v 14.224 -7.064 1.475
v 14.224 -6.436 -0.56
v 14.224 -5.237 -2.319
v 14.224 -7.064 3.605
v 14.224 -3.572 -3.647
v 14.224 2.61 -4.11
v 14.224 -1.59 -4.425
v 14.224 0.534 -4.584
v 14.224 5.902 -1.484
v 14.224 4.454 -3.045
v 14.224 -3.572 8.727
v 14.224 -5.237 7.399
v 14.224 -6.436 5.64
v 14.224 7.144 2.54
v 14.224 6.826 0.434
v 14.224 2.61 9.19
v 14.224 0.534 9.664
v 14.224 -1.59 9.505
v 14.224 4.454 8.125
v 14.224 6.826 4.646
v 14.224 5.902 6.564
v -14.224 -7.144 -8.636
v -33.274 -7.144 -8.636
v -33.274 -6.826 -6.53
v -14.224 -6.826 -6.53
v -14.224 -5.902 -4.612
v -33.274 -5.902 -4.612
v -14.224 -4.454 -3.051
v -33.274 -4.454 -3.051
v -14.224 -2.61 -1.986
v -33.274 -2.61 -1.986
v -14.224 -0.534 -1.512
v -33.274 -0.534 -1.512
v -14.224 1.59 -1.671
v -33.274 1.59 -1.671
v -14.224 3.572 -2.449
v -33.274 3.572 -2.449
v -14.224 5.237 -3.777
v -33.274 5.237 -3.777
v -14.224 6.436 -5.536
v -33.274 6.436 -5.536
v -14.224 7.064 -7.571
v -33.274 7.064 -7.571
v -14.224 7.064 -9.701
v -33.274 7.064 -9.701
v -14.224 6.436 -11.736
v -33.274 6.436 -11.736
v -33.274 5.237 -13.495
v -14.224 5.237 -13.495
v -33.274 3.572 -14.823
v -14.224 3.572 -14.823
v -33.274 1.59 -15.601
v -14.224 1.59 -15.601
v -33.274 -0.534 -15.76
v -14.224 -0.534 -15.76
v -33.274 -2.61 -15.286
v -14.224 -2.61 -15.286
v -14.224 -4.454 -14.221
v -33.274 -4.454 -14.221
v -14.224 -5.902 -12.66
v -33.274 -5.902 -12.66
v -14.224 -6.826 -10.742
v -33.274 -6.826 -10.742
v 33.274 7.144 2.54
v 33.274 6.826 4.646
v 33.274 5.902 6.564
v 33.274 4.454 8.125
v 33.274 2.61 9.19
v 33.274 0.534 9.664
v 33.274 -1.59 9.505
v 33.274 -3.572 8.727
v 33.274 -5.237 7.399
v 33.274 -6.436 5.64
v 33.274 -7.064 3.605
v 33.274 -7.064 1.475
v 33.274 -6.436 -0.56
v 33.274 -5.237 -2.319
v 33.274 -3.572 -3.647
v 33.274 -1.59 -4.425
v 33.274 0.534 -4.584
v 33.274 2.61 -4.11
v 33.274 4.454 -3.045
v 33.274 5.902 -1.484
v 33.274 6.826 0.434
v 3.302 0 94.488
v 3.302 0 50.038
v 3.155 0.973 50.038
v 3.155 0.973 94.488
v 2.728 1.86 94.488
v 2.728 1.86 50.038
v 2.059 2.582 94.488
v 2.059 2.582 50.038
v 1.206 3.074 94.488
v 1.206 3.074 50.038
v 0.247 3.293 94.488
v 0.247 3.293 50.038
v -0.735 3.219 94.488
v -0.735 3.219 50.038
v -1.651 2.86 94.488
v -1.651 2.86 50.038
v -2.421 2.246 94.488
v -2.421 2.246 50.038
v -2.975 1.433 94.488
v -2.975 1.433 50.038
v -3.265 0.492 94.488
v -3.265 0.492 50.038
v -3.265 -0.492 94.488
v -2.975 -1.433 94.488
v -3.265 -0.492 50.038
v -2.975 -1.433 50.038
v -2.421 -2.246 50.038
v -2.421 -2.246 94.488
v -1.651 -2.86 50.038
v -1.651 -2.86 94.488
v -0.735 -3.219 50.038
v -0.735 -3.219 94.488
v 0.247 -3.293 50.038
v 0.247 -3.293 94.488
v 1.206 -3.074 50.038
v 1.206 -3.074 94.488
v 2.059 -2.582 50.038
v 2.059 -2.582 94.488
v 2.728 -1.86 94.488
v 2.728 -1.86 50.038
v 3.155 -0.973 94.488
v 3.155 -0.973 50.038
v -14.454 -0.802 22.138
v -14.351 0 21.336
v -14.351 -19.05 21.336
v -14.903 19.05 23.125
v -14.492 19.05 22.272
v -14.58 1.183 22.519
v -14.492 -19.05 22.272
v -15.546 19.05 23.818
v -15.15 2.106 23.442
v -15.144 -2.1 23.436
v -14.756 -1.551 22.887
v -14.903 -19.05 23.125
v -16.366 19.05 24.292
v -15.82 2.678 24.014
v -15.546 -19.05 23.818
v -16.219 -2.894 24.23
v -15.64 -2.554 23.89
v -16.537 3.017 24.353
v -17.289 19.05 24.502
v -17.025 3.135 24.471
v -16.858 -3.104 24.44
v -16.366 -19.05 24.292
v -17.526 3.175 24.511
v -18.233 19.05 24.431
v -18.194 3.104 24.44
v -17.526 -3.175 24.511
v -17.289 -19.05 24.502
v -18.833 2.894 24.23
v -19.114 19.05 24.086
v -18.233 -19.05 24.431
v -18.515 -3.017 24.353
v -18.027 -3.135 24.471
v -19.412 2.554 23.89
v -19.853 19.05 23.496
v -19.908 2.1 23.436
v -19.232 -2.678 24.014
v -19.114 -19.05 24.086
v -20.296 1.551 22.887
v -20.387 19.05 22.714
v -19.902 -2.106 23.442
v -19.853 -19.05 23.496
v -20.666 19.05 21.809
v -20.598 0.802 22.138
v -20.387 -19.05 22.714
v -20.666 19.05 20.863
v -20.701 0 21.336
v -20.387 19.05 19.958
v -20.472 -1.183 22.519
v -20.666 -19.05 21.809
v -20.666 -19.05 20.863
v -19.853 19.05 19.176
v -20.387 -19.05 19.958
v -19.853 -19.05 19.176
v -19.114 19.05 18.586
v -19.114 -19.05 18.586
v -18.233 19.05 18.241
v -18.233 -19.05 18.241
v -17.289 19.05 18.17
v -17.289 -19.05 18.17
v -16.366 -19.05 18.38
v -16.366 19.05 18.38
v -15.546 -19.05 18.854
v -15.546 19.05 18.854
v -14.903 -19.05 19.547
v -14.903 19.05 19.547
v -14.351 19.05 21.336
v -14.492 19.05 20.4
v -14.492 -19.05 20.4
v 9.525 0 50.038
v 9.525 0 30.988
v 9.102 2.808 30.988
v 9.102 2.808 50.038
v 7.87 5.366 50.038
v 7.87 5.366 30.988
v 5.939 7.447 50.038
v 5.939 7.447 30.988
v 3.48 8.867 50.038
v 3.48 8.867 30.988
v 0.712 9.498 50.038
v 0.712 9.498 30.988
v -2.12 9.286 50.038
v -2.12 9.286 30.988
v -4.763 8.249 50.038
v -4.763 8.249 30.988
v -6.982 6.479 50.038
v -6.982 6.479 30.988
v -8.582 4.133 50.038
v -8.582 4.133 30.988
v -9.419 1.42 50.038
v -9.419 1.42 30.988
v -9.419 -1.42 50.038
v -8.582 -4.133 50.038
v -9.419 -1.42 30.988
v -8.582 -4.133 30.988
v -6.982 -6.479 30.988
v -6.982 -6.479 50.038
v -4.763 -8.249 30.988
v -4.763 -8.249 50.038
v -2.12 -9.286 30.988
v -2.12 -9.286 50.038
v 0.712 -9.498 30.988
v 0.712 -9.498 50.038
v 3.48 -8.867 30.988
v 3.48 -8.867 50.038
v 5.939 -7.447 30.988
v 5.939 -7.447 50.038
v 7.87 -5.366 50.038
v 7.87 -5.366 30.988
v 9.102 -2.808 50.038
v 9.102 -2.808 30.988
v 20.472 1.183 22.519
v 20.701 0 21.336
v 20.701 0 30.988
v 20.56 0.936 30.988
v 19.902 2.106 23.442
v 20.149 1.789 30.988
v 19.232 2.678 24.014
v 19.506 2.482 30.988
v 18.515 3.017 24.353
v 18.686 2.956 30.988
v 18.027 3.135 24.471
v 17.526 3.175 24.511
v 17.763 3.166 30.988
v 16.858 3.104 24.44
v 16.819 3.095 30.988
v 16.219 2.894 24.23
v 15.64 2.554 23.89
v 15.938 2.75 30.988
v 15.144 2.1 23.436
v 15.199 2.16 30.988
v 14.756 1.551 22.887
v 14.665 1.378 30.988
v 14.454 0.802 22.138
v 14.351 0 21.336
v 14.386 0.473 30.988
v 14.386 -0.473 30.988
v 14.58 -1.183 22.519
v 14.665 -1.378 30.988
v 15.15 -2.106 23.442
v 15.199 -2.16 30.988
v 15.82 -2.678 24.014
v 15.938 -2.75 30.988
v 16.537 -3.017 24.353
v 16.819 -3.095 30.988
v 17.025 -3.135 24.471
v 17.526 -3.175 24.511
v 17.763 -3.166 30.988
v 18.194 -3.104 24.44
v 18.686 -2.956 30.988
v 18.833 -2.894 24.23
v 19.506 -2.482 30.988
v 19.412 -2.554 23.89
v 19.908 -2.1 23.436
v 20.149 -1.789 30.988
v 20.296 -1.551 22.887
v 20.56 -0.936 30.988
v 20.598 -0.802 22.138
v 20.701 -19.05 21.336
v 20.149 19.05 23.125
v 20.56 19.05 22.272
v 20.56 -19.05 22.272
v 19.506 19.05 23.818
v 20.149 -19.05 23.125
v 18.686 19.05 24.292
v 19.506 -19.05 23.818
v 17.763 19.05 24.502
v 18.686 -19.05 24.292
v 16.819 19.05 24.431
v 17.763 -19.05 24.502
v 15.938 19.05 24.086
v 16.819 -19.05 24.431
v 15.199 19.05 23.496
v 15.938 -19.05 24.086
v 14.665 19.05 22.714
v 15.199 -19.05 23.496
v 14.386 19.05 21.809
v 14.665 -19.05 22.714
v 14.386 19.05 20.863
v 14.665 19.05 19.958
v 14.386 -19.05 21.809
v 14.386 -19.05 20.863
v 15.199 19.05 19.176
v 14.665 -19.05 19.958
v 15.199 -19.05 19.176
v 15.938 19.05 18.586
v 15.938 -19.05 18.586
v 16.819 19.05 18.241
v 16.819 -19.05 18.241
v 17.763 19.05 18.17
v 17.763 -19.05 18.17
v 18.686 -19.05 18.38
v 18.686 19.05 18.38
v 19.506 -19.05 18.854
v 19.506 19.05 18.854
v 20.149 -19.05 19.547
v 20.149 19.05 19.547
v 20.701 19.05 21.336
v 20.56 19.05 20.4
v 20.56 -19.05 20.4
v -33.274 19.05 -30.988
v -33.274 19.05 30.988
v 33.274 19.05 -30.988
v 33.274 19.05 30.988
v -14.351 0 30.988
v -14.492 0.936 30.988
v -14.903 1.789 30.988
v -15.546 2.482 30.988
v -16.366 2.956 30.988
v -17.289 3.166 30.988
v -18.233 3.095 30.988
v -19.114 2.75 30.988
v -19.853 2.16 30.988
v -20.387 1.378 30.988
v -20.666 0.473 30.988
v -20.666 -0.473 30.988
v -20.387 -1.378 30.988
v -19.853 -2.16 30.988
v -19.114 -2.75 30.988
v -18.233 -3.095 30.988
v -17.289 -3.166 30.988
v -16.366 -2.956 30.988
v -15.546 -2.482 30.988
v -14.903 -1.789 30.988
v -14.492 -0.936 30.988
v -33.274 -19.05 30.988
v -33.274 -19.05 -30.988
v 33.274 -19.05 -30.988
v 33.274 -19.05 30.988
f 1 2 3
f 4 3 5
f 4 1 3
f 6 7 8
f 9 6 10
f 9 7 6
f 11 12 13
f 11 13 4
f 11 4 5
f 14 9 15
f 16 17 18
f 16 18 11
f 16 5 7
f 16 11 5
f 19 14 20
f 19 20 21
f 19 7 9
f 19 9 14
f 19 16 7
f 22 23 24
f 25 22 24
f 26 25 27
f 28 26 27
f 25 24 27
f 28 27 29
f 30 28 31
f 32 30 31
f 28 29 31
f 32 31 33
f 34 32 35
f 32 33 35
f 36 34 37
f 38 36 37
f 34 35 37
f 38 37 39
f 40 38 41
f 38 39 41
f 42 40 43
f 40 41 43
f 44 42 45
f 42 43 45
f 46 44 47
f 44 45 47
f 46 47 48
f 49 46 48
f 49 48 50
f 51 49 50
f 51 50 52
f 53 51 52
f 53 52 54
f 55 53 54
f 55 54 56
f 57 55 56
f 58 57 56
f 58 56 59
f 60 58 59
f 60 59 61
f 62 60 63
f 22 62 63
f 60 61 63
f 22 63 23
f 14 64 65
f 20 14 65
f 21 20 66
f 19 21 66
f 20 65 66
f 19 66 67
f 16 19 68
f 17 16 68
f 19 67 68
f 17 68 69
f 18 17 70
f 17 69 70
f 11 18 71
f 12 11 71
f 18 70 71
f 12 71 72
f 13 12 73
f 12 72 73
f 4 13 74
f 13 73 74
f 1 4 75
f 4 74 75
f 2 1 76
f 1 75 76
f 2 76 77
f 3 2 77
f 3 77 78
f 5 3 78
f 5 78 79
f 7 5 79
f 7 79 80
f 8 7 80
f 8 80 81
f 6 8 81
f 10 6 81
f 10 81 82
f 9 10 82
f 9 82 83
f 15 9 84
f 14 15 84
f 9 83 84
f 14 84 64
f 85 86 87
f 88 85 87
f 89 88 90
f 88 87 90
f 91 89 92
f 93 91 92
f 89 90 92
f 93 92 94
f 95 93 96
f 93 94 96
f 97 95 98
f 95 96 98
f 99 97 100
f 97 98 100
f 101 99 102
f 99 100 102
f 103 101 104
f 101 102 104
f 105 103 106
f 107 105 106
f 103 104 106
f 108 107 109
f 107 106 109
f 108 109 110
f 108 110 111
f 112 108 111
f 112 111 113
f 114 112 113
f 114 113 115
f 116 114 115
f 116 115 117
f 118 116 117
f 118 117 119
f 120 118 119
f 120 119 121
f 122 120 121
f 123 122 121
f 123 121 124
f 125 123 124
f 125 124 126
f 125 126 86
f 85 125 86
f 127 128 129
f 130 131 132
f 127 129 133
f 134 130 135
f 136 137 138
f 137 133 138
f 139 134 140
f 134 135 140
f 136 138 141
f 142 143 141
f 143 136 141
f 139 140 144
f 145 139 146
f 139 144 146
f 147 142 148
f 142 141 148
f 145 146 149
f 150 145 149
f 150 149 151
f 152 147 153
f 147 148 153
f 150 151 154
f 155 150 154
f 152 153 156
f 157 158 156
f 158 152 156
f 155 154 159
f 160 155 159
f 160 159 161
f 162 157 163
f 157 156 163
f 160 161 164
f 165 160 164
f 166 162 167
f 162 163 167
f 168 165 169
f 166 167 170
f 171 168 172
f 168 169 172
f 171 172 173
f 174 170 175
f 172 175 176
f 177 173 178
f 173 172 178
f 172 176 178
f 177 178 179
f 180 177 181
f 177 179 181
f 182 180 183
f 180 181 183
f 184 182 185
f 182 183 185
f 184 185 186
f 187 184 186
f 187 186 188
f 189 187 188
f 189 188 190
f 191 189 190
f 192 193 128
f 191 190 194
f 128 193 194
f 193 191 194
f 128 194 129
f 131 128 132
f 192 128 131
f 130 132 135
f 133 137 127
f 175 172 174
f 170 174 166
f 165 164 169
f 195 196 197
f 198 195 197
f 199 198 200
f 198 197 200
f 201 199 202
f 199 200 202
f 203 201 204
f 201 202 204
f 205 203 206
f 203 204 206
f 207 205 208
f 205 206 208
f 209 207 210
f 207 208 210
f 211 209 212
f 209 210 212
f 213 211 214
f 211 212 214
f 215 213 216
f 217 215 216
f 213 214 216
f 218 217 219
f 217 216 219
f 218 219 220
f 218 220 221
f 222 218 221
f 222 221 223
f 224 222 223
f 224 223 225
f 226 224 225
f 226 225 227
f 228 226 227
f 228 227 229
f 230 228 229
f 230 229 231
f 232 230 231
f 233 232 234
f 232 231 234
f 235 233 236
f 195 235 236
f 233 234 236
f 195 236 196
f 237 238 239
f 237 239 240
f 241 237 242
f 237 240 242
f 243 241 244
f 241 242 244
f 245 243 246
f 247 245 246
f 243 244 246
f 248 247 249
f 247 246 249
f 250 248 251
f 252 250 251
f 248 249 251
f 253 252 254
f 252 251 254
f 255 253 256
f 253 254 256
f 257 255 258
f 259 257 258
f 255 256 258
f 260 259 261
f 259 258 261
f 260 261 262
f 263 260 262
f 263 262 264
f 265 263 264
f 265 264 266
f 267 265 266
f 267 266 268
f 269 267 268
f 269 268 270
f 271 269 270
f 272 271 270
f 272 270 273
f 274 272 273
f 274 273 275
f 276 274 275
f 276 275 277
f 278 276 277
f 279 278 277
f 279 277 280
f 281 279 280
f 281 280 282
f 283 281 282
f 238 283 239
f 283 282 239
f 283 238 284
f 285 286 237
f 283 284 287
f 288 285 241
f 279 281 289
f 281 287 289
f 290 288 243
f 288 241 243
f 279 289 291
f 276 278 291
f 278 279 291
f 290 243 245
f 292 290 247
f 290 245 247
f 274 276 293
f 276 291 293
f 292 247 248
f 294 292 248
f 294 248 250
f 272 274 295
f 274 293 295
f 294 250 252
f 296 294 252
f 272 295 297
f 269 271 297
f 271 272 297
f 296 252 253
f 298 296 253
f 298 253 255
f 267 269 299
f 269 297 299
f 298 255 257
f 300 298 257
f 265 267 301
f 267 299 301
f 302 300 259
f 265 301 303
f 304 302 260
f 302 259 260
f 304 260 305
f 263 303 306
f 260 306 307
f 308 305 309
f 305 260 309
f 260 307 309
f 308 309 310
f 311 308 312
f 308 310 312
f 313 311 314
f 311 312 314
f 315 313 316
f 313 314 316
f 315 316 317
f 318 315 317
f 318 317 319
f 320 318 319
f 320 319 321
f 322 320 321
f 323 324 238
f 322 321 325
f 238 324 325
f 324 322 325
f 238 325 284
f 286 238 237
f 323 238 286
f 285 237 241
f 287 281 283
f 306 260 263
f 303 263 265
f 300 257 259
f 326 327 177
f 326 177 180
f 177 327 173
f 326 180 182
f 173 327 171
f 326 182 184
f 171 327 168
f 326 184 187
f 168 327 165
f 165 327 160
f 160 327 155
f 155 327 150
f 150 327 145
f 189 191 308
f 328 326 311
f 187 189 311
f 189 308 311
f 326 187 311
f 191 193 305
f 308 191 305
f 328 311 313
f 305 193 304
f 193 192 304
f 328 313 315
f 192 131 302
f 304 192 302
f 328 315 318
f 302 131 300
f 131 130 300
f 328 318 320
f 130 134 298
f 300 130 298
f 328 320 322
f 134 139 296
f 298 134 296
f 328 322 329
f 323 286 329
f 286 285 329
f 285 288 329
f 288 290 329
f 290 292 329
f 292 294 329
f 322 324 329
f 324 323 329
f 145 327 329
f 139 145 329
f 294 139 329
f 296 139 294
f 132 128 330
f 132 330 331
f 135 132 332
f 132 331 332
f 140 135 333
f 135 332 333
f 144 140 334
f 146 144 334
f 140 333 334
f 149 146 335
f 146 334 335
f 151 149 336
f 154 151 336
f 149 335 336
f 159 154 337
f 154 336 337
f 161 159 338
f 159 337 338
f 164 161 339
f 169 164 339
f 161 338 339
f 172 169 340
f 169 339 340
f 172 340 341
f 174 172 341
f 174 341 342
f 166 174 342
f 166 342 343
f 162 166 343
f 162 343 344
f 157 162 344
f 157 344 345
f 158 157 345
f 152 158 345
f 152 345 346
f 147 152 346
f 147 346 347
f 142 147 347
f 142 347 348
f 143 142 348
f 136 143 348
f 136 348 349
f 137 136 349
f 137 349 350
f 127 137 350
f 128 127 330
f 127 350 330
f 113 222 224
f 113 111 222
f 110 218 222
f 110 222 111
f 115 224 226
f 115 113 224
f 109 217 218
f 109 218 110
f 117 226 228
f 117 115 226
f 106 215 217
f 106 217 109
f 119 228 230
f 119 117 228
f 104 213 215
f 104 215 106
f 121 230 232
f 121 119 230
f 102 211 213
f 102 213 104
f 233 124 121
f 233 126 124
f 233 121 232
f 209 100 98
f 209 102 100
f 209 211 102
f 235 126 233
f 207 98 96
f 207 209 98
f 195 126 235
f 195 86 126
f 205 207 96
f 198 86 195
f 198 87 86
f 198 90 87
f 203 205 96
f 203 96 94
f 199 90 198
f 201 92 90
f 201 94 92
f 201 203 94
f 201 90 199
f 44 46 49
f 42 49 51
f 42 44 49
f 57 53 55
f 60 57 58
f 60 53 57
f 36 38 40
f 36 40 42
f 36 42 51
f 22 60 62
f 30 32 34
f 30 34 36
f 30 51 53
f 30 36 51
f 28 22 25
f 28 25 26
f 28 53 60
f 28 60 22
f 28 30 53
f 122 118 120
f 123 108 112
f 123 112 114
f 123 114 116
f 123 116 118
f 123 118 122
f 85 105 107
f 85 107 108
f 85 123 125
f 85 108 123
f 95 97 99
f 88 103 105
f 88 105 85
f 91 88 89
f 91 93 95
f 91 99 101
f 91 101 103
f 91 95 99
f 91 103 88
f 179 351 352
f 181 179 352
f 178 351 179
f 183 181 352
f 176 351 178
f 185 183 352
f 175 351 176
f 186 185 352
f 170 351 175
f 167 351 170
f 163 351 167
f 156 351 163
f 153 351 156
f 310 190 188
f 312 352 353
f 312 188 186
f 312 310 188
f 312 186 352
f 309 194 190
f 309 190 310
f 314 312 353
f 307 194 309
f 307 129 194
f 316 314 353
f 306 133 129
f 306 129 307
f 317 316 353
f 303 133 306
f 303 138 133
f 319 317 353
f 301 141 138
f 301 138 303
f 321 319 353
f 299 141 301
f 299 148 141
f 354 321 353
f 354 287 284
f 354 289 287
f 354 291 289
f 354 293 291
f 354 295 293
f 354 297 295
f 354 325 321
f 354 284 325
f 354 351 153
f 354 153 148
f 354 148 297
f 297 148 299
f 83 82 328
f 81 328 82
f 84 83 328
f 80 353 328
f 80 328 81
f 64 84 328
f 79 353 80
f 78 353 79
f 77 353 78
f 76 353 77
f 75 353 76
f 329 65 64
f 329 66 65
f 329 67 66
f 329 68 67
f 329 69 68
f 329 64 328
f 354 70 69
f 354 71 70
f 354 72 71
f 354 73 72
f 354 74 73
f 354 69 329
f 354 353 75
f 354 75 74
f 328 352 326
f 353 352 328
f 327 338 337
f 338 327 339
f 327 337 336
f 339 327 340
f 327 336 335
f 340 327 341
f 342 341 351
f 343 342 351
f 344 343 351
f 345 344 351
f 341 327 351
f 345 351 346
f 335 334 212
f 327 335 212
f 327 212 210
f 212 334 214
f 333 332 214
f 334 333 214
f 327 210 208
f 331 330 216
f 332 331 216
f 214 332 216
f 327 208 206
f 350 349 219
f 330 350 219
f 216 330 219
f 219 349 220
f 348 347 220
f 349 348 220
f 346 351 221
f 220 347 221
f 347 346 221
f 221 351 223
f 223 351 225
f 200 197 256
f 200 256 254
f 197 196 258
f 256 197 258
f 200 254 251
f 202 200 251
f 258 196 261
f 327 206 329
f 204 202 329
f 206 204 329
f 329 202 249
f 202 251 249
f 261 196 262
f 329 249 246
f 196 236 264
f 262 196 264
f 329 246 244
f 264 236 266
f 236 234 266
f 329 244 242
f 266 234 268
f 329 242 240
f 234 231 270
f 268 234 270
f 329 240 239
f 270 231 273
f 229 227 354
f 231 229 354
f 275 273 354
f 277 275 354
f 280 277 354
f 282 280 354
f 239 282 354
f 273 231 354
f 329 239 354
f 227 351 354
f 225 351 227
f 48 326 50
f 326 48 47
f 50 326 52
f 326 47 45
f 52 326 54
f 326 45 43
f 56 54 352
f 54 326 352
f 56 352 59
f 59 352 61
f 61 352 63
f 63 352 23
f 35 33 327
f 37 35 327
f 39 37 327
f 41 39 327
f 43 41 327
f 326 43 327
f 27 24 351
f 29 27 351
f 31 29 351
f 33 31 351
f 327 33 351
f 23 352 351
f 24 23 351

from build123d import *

# Parameters (mm, degrees)
F0_W      = 66.548
F0_H      = 61.976
F1_DEPTH  = 19.05
F2_R      = 9.525
F2_R_2    = 3.302
F3_DEPTH  = 19.05
F3_FACE_R = 3.302
F4_DEPTH  = 63.5
F2_R_3    = 3.175
F5_DEPTH  = 9.652
F6_R      = 3.175
F7_DEPTH  = 38.101
F8_R      = 7.14375
F9_DEPTH  = 19.05
F10_R     = 7.14375
F11_DEPTH = 19.05


with BuildPart() as f1:
    # F0 (on Front) → F1 (new body, symmetric)
    with BuildSketch(Plane.XZ):
        Rectangle(F0_W, F0_H)
    extrude(amount=F1_DEPTH, both=True)

    # F2 (on face) → F3 (join)
    with BuildSketch(Plane.XY.offset(30.988)):
        Circle(F2_R)
        Circle(F2_R_2, mode=Mode.SUBTRACT)
    extrude(amount=F3_DEPTH)

    # F3_face (on face) → F4 (join)
    with BuildSketch(Plane.XY.offset(30.988)):
        Circle(F3_FACE_R)
    extrude(amount=F4_DEPTH)

    # F2 (on face) → F5 (cut)
    with BuildSketch(Plane.XY.offset(30.988)):
        with Locations((-17.526, 0)):
            Circle(F2_R_3)
        with Locations((17.526, 0)):
            Circle(F2_R_3)
    extrude(amount=-F5_DEPTH, mode=Mode.SUBTRACT)

    # F6 (on face) → F7 (cut, through all)
    with BuildSketch(Plane.XZ.offset(19.05)):
        with Locations((-17.526, 21.336)):
            Circle(F6_R)
        with Locations((17.526, 21.336)):
            Circle(F6_R)
    extrude(amount=-F7_DEPTH, mode=Mode.SUBTRACT)

    # F8 (on face) → F9 (cut)
    with BuildSketch(Plane.YZ.offset(33.274)):
        with Locations((0, 2.54)):
            Circle(F8_R)
    extrude(amount=-F9_DEPTH, mode=Mode.SUBTRACT)

    # F10 (on face) → F11 (cut)
    with BuildSketch(Plane(origin=(-33.274, 0, 0), x_dir=(0, -1, 0), z_dir=(-1, 0, 0))):
        with Locations((0, -8.636)):
            Circle(F10_R)
    extrude(amount=-F11_DEPTH, mode=Mode.SUBTRACT)


solid = f1.part
